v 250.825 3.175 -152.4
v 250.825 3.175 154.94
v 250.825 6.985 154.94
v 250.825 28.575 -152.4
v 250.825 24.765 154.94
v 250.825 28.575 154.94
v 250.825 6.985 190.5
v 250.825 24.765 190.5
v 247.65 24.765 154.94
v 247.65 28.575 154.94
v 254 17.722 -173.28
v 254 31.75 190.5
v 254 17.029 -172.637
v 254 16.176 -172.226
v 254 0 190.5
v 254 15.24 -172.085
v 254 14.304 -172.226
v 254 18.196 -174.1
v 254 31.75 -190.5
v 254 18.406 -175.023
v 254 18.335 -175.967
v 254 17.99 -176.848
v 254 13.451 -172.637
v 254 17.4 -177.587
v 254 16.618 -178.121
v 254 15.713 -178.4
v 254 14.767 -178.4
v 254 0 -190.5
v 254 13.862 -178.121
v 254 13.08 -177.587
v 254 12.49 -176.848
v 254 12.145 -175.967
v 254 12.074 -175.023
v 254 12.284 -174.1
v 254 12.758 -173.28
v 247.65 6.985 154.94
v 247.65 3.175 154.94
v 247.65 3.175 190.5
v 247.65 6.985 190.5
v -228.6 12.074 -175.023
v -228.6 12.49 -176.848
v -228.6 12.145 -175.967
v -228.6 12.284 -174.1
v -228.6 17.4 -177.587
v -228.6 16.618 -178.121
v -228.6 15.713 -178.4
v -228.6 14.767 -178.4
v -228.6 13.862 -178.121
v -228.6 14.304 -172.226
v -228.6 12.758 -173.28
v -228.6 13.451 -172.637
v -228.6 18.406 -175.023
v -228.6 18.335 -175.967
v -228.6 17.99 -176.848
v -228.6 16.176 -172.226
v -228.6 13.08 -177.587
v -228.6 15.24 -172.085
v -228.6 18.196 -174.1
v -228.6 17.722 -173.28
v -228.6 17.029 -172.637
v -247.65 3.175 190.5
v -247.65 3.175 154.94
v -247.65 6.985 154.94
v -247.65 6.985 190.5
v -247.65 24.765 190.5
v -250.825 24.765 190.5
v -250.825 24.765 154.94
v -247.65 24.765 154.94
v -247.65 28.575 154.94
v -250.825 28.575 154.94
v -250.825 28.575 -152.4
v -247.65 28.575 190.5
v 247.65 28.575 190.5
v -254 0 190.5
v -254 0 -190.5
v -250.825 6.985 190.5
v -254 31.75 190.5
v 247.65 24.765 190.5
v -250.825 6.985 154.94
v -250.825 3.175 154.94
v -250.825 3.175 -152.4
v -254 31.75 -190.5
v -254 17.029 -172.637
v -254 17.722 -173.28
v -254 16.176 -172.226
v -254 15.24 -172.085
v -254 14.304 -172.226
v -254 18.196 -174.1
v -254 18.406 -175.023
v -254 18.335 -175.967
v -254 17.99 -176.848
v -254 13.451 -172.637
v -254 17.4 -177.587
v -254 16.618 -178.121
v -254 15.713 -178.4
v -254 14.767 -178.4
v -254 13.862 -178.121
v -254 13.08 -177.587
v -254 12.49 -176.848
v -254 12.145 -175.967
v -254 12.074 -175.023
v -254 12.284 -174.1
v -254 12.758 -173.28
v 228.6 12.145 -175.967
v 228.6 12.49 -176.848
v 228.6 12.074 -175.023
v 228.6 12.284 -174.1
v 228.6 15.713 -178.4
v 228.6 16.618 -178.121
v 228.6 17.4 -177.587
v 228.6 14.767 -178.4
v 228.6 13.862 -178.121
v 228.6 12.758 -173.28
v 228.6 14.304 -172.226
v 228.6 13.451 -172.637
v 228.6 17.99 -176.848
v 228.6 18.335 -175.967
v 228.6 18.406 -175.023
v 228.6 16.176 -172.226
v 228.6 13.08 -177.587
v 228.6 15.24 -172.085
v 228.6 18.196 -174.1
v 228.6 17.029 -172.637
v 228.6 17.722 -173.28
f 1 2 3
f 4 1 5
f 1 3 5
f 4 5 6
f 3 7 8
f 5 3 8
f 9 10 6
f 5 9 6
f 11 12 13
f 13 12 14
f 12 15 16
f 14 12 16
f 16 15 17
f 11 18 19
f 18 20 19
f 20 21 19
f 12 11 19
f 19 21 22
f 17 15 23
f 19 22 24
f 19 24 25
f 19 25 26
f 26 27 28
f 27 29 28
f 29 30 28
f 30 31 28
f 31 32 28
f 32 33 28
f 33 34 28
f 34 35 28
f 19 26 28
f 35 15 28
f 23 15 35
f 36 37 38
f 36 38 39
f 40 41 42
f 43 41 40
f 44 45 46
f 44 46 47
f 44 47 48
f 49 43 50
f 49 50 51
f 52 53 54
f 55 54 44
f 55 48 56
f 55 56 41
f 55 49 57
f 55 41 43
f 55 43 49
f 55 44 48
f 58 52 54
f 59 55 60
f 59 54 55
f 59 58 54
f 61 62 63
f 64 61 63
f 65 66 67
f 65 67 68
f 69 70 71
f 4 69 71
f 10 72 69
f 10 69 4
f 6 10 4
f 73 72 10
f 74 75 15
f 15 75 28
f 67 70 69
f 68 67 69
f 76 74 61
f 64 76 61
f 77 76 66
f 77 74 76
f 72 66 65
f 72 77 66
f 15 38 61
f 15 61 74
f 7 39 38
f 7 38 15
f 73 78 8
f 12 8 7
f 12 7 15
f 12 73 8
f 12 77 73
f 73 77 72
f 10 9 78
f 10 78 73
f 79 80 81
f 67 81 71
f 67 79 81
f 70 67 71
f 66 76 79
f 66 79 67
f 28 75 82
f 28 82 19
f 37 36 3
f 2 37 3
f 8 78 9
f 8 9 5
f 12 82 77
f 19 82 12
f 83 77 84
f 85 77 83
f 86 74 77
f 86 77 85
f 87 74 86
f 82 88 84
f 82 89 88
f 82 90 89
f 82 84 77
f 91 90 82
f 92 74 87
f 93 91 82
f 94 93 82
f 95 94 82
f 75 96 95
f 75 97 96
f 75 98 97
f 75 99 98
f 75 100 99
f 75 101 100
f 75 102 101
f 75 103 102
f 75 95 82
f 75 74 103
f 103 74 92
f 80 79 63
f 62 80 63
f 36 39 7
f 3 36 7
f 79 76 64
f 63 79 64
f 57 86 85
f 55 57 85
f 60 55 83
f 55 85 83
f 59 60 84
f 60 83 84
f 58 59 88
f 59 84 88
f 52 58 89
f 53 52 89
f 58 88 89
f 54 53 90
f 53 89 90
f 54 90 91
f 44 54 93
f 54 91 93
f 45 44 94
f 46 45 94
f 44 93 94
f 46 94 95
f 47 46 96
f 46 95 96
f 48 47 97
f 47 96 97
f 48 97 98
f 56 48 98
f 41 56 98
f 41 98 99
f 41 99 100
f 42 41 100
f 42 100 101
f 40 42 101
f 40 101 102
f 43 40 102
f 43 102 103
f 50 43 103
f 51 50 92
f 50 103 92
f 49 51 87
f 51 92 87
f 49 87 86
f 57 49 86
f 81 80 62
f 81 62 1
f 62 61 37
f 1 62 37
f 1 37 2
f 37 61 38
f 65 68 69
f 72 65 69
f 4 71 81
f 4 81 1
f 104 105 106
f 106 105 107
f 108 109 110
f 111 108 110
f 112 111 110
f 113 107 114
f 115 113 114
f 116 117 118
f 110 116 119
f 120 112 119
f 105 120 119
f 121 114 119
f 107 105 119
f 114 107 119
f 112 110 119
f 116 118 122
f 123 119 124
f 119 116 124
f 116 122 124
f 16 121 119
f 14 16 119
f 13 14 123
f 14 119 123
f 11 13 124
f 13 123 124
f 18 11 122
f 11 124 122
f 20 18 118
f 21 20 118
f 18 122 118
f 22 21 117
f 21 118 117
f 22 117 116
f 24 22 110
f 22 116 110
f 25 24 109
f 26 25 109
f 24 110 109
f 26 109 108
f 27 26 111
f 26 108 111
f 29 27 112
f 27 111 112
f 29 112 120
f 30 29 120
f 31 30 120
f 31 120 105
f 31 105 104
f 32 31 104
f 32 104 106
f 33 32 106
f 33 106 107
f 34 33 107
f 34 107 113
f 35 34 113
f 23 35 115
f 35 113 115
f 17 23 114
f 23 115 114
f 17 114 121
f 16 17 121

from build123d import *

# Parameters (mm, degrees)
SKETCH1_W           = 508
SKETCH1_H           = 381
BOSS_EXTRUDE1_DEPTH = 31.75
SKETCH2_W           = 501.65
SKETCH2_H           = 25.4
CUT_EXTRUDE1_DEPTH  = 342.9
SKETCH3_W           = 3.175
SKETCH3_H           = 3.81
BOSS_EXTRUDE2_DEPTH = 35.56
SKETCH4_R           = 3.175
CUT_EXTRUDE2_DEPTH  = 25.4
CUT_EXTRUDE3_START  = -482.6
SKETCH4_2_R         = 3.175
CUT_EXTRUDE3_DEPTH  = 25.4


with BuildPart() as part:
    # Sketch1 → Boss-Extrude1 (new body)
    with BuildSketch(Plane(origin=(0, 0, 0), x_dir=(1, 0, 0), z_dir=(0, 1, 0))):
        Rectangle(SKETCH1_W, SKETCH1_H)
    extrude(amount=BOSS_EXTRUDE1_DEPTH)

    # Sketch2 → Cut-Extrude1 (cut)
    with BuildSketch(Plane.XY.offset(190.5)):
        with Locations((0, 15.875)):
            Rectangle(SKETCH2_W, SKETCH2_H)
    extrude(amount=-CUT_EXTRUDE1_DEPTH, mode=Mode.SUBTRACT)

    # Sketch3 → Boss-Extrude2 (add)
    with BuildSketch(Plane.XY.offset(190.5)):
        with Locations((-249.2375, 26.67)):
            Rectangle(SKETCH3_W, SKETCH3_H)
        with Locations((-249.2375, 5.08)):
            Rectangle(SKETCH3_W, SKETCH3_H)
        with Locations((249.2375, 5.08)):
            Rectangle(SKETCH3_W, SKETCH3_H)
        with Locations((249.2375, 26.67)):
            Rectangle(SKETCH3_W, SKETCH3_H)
    extrude(amount=-BOSS_EXTRUDE2_DEPTH)

    # Sketch4 → Cut-Extrude2 (cut)
    with BuildSketch(Plane.ZY.offset(254)):
        with Locations((-175.26, 15.24)):
            Circle(SKETCH4_R)
    extrude(amount=-CUT_EXTRUDE2_DEPTH, mode=Mode.SUBTRACT)

    # Sketch4<2> → Cut-Extrude3 (cut)
    with BuildSketch(Plane.ZY.offset(254).offset(CUT_EXTRUDE3_START)):
        with Locations((-175.26, 15.24)):
            Circle(SKETCH4_2_R)
    extrude(amount=-CUT_EXTRUDE3_DEPTH, mode=Mode.SUBTRACT)


solid = part.part
